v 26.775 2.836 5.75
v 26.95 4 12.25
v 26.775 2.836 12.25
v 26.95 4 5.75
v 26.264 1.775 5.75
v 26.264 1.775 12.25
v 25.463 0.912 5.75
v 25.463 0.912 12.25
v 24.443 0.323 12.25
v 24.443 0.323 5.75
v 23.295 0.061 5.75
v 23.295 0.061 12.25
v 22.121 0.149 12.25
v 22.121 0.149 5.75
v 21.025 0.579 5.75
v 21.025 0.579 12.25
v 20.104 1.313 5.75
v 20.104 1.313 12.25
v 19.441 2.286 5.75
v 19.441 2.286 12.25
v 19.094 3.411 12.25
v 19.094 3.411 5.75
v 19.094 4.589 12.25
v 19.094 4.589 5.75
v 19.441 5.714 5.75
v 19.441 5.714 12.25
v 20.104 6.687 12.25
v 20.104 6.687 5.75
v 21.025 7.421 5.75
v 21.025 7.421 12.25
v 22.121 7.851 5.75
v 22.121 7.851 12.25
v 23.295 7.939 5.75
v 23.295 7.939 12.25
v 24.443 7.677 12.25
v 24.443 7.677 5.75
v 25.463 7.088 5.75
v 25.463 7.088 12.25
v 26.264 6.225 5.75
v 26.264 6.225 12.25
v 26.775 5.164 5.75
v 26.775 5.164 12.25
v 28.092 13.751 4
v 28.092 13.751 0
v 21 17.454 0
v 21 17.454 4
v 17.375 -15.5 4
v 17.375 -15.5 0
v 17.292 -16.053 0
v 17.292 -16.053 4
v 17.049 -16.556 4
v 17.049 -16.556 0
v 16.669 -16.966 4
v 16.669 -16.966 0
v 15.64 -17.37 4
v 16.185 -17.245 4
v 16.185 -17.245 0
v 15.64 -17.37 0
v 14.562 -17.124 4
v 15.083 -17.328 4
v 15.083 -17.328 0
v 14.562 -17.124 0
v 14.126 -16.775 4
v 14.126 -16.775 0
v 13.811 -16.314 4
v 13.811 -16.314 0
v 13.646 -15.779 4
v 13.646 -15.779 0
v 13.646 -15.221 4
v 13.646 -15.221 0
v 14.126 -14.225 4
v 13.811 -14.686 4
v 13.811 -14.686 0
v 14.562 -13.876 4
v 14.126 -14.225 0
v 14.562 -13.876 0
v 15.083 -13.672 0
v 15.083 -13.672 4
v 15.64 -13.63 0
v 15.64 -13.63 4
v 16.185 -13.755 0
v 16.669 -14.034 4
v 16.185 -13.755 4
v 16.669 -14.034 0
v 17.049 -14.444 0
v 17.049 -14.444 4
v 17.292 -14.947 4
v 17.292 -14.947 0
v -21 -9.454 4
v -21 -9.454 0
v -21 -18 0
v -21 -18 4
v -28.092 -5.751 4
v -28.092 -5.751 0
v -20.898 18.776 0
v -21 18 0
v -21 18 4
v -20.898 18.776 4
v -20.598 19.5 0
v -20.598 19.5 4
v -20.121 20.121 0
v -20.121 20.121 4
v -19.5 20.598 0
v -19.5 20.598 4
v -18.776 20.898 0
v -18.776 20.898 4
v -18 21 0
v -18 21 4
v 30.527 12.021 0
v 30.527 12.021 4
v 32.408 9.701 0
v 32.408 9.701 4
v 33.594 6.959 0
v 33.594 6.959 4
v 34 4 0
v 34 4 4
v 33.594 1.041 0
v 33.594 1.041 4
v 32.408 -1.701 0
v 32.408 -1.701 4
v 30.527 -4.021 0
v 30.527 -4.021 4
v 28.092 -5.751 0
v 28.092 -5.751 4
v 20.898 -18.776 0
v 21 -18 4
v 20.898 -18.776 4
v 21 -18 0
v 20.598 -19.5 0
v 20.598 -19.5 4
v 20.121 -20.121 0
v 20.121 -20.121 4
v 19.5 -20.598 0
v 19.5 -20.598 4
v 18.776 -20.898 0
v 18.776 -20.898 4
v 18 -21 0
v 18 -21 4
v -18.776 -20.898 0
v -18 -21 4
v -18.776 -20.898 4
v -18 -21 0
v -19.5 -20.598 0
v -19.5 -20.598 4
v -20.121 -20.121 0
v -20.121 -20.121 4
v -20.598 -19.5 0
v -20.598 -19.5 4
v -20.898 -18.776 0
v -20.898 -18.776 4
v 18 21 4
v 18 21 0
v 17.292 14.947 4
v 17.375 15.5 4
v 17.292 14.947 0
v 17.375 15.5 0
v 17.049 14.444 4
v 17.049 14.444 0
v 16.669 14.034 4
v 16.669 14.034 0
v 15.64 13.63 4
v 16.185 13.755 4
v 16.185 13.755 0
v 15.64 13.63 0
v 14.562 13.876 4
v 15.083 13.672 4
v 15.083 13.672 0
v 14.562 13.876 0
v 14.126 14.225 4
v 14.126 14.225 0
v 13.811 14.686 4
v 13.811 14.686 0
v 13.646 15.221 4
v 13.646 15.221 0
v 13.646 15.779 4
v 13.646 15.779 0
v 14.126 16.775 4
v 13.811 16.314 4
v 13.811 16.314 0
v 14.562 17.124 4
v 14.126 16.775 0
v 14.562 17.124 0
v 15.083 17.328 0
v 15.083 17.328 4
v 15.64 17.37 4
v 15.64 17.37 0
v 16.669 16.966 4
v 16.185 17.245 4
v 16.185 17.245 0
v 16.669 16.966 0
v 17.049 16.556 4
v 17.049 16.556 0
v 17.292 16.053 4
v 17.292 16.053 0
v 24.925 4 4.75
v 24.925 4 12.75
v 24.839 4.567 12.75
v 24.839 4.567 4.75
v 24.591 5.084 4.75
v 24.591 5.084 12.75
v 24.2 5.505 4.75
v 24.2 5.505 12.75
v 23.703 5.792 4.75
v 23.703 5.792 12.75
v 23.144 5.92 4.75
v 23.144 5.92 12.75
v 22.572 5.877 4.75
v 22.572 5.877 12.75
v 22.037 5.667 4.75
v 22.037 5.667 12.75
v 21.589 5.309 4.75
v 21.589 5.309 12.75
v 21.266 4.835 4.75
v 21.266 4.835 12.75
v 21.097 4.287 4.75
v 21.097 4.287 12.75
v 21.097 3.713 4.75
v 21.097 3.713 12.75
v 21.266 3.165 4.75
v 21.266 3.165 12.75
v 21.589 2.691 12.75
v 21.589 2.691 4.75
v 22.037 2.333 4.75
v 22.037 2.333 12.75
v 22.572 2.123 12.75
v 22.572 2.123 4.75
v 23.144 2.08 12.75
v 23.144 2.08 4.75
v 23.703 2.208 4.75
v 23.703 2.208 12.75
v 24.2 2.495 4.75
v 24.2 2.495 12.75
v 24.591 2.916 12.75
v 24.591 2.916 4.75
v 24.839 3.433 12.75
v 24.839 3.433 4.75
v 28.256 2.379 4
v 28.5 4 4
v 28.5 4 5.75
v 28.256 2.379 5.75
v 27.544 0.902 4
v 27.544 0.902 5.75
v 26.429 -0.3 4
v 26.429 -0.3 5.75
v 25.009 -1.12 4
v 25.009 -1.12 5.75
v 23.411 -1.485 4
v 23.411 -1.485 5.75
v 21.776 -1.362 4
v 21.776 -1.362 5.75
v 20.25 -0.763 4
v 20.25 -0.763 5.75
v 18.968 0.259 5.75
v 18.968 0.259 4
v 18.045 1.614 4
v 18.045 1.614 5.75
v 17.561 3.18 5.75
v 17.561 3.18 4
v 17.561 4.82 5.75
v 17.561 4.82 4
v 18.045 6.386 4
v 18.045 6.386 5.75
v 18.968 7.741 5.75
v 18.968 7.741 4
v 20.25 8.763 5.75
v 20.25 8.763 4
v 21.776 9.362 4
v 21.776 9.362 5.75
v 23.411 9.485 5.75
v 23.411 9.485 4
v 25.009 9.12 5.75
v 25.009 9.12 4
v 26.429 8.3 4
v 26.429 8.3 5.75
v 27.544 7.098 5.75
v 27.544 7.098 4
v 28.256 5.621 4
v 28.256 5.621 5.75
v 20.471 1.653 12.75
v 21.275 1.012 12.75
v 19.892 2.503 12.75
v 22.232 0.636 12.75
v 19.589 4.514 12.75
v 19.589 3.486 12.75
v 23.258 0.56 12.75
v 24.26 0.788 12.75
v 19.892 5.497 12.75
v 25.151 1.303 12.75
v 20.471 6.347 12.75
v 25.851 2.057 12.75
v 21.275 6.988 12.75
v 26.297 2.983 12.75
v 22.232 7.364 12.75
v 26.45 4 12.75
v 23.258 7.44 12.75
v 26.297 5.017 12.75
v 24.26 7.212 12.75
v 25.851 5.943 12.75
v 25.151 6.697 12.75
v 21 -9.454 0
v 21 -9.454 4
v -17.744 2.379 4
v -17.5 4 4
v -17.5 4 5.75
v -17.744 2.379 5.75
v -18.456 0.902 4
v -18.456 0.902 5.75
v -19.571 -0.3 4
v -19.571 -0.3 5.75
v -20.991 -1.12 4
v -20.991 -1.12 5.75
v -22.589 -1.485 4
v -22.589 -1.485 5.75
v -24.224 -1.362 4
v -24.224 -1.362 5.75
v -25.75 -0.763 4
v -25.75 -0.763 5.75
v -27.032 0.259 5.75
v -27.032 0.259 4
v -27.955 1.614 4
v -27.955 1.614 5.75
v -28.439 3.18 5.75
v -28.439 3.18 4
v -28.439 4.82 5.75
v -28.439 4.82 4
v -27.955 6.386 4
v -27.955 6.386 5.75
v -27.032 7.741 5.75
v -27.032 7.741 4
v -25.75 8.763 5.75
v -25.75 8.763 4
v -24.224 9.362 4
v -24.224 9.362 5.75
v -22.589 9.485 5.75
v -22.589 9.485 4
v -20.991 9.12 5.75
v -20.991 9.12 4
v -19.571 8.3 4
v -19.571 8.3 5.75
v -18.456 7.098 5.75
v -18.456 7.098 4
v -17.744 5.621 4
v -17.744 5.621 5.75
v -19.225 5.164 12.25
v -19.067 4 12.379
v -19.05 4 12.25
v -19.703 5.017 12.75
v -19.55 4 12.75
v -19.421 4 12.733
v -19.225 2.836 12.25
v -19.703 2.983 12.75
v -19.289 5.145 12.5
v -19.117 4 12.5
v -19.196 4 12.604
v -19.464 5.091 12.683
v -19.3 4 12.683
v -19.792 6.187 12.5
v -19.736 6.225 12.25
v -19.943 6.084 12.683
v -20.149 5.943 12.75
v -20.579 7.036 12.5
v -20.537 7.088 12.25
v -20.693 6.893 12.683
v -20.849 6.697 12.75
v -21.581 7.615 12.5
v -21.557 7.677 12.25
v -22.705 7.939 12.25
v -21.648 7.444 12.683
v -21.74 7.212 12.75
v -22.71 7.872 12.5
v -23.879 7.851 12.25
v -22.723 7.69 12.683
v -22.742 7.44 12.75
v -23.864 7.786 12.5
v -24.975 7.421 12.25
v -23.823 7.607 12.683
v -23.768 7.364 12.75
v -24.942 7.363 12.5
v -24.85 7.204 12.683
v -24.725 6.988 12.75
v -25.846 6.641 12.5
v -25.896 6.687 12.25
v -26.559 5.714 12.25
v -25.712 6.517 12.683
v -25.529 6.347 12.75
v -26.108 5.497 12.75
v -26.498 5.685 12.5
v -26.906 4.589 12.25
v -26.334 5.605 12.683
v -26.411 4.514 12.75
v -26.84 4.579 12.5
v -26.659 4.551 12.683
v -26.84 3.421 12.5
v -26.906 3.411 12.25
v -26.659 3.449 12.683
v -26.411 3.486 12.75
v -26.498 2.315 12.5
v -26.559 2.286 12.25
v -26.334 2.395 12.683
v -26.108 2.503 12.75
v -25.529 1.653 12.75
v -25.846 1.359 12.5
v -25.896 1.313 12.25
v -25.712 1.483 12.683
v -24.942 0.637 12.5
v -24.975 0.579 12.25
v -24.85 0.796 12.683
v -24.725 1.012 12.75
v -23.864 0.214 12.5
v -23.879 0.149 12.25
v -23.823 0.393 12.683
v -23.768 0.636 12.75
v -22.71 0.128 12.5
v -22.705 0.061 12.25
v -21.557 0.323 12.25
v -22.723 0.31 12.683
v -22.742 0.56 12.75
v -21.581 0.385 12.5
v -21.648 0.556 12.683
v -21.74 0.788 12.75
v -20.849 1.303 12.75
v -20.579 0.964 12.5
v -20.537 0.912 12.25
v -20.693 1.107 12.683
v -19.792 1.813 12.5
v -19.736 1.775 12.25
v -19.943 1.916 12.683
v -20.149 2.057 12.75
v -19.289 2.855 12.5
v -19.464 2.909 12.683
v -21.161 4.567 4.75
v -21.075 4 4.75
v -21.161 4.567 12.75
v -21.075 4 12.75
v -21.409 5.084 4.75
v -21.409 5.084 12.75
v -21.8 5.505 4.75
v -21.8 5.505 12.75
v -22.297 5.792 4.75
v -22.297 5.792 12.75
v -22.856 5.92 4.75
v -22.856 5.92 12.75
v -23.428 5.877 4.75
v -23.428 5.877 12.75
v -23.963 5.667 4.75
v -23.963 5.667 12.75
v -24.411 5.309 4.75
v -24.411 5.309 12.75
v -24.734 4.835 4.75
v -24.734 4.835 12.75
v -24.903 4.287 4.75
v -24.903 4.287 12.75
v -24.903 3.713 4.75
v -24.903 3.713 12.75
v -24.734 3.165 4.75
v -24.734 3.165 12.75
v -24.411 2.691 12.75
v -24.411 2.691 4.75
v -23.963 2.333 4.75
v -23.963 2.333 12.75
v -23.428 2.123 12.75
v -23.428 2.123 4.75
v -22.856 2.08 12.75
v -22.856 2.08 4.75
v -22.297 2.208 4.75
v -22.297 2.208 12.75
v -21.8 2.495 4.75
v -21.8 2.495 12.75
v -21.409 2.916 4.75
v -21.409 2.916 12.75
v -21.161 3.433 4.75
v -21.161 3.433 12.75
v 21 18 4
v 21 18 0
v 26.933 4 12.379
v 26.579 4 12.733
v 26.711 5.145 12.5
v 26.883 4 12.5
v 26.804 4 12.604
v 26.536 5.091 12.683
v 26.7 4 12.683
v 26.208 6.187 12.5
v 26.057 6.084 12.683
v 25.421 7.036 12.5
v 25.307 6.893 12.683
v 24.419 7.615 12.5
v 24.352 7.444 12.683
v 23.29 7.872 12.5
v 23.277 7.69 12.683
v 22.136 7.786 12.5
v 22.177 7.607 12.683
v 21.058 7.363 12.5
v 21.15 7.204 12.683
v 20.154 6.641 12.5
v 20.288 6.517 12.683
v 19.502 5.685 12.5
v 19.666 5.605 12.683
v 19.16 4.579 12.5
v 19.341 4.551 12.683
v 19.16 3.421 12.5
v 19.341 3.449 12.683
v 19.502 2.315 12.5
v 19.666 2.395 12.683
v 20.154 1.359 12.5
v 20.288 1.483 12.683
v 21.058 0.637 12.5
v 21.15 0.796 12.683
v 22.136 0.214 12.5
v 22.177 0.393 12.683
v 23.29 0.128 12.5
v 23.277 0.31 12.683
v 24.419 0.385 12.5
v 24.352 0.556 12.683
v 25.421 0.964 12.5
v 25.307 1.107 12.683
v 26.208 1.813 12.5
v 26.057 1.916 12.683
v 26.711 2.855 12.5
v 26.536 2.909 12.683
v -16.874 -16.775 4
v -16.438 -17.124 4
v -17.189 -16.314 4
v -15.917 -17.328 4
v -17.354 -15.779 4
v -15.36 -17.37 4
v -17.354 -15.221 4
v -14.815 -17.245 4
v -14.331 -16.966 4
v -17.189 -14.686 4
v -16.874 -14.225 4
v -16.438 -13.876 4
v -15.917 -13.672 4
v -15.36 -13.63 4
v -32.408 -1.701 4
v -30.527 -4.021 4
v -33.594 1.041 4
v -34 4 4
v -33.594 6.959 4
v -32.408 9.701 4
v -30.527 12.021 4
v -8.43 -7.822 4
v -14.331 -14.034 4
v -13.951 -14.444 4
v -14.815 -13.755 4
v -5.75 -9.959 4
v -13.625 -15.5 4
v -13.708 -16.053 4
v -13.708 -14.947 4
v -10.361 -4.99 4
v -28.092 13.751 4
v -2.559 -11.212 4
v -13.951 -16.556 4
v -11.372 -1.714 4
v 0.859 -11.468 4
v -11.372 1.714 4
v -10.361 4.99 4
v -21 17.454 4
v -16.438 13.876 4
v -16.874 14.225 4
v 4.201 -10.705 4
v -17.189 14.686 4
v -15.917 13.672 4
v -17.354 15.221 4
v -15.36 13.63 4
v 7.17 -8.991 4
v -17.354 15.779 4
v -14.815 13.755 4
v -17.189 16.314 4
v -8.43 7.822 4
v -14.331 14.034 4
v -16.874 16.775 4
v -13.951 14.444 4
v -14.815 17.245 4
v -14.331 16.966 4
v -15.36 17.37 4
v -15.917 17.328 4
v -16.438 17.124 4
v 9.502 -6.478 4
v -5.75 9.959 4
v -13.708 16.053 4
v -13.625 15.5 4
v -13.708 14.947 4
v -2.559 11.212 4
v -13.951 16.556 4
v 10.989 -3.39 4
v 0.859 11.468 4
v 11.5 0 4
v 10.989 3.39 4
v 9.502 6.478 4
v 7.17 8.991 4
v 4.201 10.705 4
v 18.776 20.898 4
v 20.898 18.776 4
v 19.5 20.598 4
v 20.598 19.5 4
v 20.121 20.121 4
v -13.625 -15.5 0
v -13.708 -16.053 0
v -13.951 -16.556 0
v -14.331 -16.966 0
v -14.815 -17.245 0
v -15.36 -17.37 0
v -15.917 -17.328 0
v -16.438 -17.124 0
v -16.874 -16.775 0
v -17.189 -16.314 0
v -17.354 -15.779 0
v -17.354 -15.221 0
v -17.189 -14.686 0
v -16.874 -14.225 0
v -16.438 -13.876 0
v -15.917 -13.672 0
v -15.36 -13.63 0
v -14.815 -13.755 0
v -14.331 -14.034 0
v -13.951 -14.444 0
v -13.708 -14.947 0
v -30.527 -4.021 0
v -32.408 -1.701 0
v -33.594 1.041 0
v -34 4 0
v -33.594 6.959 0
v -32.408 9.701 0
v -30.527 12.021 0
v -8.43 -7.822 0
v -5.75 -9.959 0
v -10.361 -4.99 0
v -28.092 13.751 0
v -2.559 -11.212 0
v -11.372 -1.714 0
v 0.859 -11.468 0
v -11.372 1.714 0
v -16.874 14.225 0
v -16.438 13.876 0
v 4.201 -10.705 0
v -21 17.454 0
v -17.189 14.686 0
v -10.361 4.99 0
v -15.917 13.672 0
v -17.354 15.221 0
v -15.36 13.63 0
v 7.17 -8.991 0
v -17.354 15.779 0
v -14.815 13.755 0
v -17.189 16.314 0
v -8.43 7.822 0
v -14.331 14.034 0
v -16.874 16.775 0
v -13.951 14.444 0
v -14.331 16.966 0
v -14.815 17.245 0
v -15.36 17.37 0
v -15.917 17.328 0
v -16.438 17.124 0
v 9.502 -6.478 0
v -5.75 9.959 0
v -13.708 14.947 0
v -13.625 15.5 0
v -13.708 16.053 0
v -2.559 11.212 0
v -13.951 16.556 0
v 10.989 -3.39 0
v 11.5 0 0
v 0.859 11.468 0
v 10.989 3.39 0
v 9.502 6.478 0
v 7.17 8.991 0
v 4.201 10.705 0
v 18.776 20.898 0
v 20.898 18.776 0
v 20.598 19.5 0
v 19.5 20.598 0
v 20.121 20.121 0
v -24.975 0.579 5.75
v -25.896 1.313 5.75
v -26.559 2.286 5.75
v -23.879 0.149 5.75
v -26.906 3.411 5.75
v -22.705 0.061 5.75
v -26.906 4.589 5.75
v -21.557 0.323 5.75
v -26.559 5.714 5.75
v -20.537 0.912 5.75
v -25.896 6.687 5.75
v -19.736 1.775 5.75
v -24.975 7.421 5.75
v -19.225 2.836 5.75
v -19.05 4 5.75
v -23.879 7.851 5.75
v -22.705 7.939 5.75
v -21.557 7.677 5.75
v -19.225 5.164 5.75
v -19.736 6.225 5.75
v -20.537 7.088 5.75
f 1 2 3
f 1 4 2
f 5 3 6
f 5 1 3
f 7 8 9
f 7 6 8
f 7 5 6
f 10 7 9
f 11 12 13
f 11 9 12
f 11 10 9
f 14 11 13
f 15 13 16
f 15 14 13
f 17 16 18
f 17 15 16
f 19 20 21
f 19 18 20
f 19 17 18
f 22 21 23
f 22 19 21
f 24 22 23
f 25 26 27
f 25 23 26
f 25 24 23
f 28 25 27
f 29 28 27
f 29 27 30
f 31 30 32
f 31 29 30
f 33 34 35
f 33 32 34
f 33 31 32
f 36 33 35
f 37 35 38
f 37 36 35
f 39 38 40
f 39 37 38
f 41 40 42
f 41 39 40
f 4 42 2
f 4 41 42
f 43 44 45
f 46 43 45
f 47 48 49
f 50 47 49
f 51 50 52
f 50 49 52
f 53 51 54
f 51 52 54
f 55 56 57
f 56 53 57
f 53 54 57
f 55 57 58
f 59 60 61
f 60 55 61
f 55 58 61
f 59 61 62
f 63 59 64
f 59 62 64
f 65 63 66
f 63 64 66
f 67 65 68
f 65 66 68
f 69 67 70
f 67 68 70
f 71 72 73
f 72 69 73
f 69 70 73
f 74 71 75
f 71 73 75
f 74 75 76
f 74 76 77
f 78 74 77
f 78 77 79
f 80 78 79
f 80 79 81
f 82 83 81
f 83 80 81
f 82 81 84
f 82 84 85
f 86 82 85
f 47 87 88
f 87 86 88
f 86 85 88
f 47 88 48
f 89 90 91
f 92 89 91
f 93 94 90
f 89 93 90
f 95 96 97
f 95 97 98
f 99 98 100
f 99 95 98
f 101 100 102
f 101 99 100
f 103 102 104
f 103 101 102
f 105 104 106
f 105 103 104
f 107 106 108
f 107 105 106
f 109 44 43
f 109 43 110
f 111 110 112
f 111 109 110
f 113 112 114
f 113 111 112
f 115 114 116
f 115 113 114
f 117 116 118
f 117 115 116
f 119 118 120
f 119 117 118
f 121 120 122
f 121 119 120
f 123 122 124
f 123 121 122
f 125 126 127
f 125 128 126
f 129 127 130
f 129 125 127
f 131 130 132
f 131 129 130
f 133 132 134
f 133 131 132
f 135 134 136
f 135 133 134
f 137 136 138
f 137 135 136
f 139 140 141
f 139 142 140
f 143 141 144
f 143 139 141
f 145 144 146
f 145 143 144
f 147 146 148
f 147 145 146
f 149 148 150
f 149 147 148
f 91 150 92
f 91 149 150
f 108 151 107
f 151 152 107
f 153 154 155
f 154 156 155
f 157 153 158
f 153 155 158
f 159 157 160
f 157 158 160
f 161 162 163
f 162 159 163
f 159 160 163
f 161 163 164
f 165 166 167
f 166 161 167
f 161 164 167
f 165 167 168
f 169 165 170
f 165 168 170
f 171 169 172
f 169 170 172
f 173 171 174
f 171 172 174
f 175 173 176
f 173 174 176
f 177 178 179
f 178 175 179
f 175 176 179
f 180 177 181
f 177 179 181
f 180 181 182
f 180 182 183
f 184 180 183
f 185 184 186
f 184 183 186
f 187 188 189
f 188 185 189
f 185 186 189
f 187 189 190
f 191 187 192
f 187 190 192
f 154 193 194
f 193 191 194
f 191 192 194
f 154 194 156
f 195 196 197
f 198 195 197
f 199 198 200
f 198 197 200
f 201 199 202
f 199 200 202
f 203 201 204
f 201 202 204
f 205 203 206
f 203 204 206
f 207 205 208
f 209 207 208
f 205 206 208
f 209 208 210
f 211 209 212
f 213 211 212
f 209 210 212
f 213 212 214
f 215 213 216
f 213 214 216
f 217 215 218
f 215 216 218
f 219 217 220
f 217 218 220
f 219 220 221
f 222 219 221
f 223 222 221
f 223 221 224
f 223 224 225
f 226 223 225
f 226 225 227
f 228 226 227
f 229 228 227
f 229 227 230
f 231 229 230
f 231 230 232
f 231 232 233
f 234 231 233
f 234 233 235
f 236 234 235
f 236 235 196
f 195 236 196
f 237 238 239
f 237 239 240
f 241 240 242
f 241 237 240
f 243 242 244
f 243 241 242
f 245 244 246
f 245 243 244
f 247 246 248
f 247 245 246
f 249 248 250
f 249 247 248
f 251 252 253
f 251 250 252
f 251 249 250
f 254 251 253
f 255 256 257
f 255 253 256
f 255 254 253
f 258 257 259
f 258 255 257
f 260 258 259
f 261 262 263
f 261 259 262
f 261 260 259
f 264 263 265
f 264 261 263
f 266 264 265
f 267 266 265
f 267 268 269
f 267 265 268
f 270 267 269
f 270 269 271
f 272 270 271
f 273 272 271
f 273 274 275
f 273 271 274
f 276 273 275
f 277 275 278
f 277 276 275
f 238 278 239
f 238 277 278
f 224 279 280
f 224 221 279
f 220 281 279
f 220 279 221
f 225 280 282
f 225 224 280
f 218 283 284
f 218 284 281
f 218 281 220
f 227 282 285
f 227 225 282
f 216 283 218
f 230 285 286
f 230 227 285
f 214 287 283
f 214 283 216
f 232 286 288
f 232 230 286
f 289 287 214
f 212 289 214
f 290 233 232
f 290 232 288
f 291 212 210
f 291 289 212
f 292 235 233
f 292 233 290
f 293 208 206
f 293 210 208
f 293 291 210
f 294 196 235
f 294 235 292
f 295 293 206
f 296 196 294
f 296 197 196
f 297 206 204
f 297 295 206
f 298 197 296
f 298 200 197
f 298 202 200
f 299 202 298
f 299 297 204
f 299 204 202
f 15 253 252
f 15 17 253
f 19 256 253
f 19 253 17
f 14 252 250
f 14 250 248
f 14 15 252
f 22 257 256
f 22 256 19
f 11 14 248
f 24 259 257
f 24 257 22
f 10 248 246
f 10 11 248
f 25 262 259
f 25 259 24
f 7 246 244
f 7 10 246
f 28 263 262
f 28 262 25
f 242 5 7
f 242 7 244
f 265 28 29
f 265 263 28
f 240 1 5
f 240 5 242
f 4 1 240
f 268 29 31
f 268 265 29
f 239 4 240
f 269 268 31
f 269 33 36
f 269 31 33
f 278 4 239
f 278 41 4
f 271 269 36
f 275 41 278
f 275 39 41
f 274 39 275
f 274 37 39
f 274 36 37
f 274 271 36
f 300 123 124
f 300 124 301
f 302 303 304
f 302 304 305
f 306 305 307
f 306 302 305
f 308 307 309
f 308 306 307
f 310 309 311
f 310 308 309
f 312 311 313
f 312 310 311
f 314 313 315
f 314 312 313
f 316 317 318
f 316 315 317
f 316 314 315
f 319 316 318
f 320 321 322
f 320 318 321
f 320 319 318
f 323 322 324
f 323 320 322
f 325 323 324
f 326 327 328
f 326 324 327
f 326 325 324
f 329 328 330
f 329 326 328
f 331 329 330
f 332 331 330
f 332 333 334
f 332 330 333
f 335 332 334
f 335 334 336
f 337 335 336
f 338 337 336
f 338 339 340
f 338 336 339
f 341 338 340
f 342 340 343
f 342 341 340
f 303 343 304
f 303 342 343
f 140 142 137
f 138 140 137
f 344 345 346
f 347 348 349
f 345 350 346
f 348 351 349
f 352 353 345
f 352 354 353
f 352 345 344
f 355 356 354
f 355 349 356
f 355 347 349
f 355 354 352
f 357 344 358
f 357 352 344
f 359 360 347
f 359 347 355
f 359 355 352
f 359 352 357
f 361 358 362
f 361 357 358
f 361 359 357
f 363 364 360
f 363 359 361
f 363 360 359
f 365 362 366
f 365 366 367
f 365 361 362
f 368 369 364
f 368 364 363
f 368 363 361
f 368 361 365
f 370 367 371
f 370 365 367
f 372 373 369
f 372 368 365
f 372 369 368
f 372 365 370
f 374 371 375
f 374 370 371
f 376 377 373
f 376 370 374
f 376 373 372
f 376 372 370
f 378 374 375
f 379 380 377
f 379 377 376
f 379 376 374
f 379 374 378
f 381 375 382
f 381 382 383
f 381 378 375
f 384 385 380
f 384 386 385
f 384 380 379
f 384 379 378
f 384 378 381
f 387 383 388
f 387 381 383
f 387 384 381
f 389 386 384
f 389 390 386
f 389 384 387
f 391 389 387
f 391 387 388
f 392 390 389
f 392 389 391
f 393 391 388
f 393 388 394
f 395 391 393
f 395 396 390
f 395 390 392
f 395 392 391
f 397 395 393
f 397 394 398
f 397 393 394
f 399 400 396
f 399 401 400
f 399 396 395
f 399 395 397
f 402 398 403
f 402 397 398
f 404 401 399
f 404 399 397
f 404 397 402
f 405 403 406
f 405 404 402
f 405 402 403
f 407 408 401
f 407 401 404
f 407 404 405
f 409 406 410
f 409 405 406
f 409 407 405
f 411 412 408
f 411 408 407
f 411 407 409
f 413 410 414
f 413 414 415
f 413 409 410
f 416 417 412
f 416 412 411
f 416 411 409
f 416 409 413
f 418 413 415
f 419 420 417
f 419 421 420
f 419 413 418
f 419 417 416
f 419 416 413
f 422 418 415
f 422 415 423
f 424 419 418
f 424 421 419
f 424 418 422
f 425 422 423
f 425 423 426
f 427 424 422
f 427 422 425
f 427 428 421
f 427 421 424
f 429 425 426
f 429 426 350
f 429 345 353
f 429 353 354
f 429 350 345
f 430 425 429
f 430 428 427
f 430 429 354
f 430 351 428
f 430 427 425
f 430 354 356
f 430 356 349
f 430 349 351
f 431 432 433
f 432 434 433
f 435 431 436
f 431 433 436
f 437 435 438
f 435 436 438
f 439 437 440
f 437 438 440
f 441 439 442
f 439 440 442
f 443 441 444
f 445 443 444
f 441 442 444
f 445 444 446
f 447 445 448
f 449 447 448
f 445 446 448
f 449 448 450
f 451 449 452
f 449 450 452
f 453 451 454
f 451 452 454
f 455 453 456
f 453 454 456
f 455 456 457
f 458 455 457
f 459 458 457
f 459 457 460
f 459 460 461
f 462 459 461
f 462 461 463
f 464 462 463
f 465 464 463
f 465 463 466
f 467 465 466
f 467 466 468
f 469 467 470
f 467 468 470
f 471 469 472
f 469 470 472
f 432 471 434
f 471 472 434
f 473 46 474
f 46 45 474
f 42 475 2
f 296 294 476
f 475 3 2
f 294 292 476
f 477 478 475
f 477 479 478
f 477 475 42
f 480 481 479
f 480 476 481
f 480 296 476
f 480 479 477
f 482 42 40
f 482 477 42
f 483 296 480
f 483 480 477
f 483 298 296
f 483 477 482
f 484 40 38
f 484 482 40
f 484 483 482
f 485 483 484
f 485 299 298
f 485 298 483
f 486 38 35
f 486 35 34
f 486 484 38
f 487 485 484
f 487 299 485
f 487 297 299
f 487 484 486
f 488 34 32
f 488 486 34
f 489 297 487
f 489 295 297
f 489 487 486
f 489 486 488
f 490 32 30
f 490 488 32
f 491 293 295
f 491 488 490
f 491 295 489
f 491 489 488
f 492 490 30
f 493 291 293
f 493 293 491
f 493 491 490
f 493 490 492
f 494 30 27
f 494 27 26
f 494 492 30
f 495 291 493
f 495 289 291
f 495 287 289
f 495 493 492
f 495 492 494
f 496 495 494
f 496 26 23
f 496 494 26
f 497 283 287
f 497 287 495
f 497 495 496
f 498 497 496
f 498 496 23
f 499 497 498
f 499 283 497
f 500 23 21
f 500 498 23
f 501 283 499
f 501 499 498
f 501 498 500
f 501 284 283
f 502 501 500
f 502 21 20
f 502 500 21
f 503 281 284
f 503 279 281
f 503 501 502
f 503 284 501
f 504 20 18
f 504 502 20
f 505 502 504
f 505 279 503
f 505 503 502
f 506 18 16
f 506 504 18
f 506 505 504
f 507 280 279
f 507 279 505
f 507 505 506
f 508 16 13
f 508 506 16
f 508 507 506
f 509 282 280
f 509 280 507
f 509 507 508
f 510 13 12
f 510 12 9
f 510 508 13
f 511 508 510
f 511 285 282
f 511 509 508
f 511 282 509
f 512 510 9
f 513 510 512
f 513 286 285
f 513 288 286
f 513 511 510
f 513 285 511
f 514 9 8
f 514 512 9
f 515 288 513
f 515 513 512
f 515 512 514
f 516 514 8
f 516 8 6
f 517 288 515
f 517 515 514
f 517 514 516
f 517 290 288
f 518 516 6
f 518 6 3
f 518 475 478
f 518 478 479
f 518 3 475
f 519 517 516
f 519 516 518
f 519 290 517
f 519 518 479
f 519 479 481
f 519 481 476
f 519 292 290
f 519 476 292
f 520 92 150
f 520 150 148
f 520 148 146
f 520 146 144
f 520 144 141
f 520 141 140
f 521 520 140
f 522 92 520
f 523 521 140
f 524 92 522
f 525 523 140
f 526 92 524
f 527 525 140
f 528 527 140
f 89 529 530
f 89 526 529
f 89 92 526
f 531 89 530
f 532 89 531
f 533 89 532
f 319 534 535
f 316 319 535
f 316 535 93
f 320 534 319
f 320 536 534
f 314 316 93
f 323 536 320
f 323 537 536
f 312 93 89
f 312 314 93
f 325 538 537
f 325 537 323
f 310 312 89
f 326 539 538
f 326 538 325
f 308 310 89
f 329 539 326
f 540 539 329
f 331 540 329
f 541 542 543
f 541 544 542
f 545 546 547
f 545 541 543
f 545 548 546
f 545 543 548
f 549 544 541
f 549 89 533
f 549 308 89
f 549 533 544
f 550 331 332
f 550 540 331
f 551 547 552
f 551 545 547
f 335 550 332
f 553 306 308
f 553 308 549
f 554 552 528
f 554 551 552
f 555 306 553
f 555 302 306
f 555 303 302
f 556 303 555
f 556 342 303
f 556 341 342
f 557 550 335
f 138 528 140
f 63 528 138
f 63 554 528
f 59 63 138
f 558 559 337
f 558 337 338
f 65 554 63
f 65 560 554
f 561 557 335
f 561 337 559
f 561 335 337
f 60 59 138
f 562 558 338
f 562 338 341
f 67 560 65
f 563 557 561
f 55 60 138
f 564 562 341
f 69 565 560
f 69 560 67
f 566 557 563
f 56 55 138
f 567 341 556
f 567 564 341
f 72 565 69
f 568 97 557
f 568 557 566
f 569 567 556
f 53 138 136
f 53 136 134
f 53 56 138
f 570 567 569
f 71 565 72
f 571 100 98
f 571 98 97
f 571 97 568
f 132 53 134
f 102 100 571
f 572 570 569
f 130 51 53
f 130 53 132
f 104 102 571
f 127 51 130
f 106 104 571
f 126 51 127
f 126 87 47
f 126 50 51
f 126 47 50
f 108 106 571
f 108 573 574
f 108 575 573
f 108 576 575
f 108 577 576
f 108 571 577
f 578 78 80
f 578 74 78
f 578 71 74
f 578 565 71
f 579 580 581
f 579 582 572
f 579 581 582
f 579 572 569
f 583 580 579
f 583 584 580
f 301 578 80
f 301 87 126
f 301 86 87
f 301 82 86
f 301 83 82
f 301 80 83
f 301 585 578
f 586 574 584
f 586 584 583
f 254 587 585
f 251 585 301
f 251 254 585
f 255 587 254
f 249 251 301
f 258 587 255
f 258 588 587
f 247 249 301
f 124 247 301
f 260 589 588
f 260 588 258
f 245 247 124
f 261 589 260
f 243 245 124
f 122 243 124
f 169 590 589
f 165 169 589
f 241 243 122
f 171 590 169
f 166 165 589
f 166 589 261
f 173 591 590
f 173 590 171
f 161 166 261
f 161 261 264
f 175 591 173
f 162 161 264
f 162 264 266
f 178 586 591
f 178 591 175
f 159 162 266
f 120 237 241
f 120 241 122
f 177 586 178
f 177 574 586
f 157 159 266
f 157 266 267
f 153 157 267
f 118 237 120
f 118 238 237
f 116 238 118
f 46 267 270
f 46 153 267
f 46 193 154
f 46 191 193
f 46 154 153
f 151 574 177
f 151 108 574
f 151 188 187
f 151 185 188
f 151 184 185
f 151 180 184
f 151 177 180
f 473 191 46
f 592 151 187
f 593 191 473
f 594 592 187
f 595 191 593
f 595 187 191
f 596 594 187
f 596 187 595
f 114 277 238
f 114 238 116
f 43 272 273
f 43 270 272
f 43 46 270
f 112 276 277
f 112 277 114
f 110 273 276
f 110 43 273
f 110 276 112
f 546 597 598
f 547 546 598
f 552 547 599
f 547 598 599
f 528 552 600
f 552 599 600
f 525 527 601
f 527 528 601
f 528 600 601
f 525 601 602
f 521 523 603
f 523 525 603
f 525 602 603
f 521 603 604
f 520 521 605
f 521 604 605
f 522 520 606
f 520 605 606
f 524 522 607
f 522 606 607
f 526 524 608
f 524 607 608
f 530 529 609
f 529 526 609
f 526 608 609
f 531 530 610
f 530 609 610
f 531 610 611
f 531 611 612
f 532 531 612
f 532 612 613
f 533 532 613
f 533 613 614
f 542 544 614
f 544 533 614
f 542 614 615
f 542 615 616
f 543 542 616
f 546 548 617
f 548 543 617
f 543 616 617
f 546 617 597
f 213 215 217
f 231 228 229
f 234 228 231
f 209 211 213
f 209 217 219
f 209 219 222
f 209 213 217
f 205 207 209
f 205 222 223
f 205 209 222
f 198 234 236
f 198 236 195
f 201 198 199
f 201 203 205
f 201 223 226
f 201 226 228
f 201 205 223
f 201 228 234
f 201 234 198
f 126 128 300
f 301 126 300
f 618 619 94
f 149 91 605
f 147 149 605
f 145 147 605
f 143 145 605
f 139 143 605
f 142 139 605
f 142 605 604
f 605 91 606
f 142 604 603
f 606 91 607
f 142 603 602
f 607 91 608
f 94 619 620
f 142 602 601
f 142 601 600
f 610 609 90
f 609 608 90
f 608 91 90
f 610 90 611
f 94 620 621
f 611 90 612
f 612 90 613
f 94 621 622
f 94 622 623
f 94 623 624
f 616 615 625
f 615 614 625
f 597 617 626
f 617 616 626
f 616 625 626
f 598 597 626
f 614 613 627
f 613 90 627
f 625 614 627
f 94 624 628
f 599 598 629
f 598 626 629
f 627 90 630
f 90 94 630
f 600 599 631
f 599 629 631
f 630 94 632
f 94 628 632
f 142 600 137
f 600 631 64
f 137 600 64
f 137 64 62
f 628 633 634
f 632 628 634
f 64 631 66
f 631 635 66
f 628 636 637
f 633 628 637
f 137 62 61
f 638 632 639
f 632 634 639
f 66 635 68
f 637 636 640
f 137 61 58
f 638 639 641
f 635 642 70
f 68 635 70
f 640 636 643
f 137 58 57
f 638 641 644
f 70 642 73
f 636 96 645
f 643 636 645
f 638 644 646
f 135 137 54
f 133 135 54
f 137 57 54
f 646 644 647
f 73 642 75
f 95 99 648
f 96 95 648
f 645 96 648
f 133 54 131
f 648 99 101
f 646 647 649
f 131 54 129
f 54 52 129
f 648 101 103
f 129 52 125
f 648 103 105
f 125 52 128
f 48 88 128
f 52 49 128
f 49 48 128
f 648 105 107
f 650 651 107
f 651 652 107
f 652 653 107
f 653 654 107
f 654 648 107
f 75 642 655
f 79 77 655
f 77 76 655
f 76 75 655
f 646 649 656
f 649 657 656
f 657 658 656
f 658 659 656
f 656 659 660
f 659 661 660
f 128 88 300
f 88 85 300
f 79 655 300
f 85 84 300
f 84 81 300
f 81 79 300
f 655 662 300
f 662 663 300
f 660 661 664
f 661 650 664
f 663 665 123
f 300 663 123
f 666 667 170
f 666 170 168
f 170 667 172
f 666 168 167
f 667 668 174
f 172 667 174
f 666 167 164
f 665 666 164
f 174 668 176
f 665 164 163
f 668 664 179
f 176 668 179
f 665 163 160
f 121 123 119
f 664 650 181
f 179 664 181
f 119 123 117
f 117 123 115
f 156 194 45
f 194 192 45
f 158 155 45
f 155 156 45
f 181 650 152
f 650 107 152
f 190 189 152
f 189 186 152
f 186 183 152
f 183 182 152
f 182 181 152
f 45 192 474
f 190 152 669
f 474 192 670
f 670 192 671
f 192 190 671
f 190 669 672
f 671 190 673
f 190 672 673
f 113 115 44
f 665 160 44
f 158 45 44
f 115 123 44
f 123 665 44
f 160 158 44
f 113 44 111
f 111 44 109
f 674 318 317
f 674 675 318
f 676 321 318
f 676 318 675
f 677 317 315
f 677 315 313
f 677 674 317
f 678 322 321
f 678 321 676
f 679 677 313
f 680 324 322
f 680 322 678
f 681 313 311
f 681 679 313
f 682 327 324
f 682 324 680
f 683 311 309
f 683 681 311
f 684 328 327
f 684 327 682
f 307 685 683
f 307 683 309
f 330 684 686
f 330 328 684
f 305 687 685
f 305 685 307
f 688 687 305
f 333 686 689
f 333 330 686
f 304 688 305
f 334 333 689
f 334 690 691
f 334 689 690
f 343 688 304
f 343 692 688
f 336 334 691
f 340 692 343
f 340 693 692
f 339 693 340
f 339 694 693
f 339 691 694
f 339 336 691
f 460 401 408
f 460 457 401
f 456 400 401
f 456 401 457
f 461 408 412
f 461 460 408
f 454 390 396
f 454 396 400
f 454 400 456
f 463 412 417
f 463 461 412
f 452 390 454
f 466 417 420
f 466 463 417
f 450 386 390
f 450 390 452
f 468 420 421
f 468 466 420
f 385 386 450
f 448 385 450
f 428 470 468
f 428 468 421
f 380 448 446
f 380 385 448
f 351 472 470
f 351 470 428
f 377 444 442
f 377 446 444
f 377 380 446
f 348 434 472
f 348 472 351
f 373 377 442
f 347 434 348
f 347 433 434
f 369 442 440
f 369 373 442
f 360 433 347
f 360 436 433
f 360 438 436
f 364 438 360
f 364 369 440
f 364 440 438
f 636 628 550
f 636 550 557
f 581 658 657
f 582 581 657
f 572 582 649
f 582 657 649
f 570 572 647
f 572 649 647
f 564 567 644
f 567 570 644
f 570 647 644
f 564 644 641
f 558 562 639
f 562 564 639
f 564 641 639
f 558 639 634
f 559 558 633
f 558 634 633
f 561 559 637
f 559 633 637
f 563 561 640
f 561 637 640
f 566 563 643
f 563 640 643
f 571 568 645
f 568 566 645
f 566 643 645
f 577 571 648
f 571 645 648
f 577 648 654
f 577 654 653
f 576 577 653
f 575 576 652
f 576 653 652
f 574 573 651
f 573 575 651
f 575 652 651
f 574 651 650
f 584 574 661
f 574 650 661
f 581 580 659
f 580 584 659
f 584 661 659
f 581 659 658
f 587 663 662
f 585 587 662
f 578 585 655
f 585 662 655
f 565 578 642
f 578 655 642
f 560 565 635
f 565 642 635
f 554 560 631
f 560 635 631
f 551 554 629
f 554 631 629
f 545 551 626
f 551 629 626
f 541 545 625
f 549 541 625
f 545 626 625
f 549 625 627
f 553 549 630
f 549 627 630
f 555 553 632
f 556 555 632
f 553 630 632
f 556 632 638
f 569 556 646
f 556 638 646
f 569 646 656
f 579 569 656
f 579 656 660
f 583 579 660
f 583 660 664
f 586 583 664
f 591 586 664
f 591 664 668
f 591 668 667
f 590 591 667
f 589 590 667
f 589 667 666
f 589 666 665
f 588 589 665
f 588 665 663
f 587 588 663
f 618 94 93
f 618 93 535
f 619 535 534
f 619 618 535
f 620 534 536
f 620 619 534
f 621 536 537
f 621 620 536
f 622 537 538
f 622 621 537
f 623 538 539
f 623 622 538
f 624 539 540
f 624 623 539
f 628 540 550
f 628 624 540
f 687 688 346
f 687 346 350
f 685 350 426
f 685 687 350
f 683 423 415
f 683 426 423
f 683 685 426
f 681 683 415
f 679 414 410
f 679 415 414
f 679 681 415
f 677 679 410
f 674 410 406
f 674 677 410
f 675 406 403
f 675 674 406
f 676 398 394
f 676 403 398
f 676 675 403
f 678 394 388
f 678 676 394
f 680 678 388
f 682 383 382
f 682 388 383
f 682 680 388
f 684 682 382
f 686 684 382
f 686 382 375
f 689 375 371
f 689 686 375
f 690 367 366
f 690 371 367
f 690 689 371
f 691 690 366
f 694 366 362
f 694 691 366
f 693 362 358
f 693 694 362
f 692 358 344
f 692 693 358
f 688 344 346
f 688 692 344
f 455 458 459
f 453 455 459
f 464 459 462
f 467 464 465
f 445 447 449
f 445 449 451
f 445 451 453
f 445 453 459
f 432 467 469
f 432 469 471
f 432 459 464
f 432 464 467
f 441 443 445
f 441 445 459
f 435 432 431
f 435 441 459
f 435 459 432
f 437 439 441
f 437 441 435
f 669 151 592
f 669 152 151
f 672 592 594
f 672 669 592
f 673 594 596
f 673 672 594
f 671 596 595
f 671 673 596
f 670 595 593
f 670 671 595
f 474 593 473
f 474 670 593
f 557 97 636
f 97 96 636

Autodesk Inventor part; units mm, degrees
ref_plane "YZ Plane" through (0, 0, 0) normal (1, 0, 0) x (0, 1, 0)
ref_plane "XZ Plane" through (0, 0, 0) normal (0, 1, 0) x (-1, 0, 0)
ref_plane "XY Plane" through (0, 0, 0) normal (0, 0, 1) x (1, 0, 0)
sketch "Sketch1" plane through (0, 0, 0) normal (0, 0, 1) x (1, 0, 0)
  circle A0 centre (0, 0) radius 11.5
  line L0 (-18, -21) -> (18, -21)
  line L1 (21, -18) -> (21, 18)
  line L2 (18, 21) -> (-18, 21)
  line L3 (-21, 18) -> (-21, -18)
  line L4 (-21, -21) -> (21, 21) construction
  line L5 (21, -21) -> (-21, 21) construction
  circle A1 centre (-15.5, 15.5) radius 1.875
  circle A2 centre (15.5, 15.5) radius 1.875
  circle A3 centre (15.5, -15.5) radius 1.875
  circle A4 centre (-15.5, -15.5) radius 1.875
  line L6 (-15.5, 15.5) -> (15.5, 15.5) construction
  line L7 (15.5, 15.5) -> (15.5, -15.5) construction
  line L8 (15.5, -15.5) -> (-15.5, -15.5) construction
  line L9 (-15.5, 15.5) -> (-15.5, -15.5) construction
  line L10 (-15.5, 15.5) -> (15.5, -15.5) construction
  line L11 (15.5, 15.5) -> (0, 0) construction
  circle A5 centre (-23, 4) radius 3.95
  circle A6 centre (23, 4) radius 3.95
  circle A7 centre (-23, 4) radius 11
  circle A8 centre (23, 4) radius 11
  line L12 (0, 126.4593) -> (0, -125.5407) projected
  line L13 (-111.8366, 0) -> (126.1634, 0) projected
  circle A9 centre (-48.8366, 35.9593) radius 2.0625 projected
  circle A10 centre (-57.8366, 80.4593) radius 2.0625 projected
  circle A11 centre (-66.8366, 35.9593) radius 2.0625 projected
  circle A12 centre (-66.8366, 60.9593) radius 2.0625 projected
  circle A13 centre (-48.8366, 60.9593) radius 2.0625 projected
  circle A14 centre (63.1634, 35.9593) radius 2.0625 projected
  circle A15 centre (72.1634, 80.4593) radius 2.0625 projected
  circle A16 centre (81.1634, 35.9593) radius 2.0625 projected
  circle A17 centre (81.1634, 60.9593) radius 2.0625 projected
  circle A18 centre (63.1634, 60.9593) radius 2.0625 projected
  circle A19 centre (-48.8366, -35.0407) radius 2.0625 projected
  circle A20 centre (-57.8366, -79.5407) radius 2.0625 projected
  circle A21 centre (-66.8366, -35.0407) radius 2.0625 projected
  circle A22 centre (-66.8366, -60.0407) radius 2.0625 projected
  circle A23 centre (-48.8366, -60.0407) radius 2.0625 projected
  circle A24 centre (63.1634, -35.0407) radius 2.0625 projected
  circle A25 centre (63.1634, -60.0407) radius 2.0625 projected
  circle A26 centre (81.1634, -60.0407) radius 2.0625 projected
  circle A27 centre (81.1634, -35.0407) radius 2.0625 projected
  circle A28 centre (72.1634, -79.5407) radius 2.0625 projected
  line L14 (92.1634, -89.5407) -> (92.1634, 90.4593) projected
  line L15 (92.1634, 90.4593) -> (-77.8366, 90.4593) projected
  line L16 (-77.8366, 90.4593) -> (-77.8366, -89.5407) projected
  line L17 (-77.8366, -89.5407) -> (92.1634, -89.5407) projected
  circle A29 centre (-48.8366, 35.9593) radius 2.0625 projected
  circle A30 centre (-57.8366, 80.4593) radius 2.0625 projected
  circle A31 centre (-66.8366, 35.9593) radius 2.0625 projected
  circle A32 centre (-66.8366, 60.9593) radius 2.0625 projected
  circle A33 centre (-48.8366, 60.9593) radius 2.0625 projected
  circle A34 centre (63.1634, 35.9593) radius 2.0625 projected
  circle A35 centre (72.1634, 80.4593) radius 2.0625 projected
  circle A36 centre (81.1634, 35.9593) radius 2.0625 projected
  circle A37 centre (81.1634, 60.9593) radius 2.0625 projected
  circle A38 centre (63.1634, 60.9593) radius 2.0625 projected
  circle A39 centre (-48.8366, -35.0407) radius 2.0625 projected
  circle A40 centre (-57.8366, -79.5407) radius 2.0625 projected
  circle A41 centre (-66.8366, -35.0407) radius 2.0625 projected
  circle A42 centre (-66.8366, -60.0407) radius 2.0625 projected
  circle A43 centre (-48.8366, -60.0407) radius 2.0625 projected
  circle A44 centre (63.1634, -35.0407) radius 2.0625 projected
  circle A45 centre (63.1634, -60.0407) radius 2.0625 projected
  circle A46 centre (81.1634, -60.0407) radius 2.0625 projected
  circle A47 centre (81.1634, -35.0407) radius 2.0625 projected
  circle A48 centre (72.1634, -79.5407) radius 2.0625 projected
  line L18 (92.1634, -89.5407) -> (92.1634, 90.4593) projected
  line L19 (92.1634, 90.4593) -> (-77.8366, 90.4593) projected
  line L20 (-77.8366, 90.4593) -> (-77.8366, -89.5407) projected
  line L21 (-77.8366, -89.5407) -> (92.1634, -89.5407) projected
  arc A49 (-18, 21) -> (-21, 18) centre (-18, 18) ccw
  arc A50 (21, 18) -> (18, 21) centre (18, 18) ccw
  arc A51 (18, -21) -> (21, -18) centre (18, -18) ccw
  arc A52 (-21, -18) -> (-18, -21) centre (-18, -18) ccw
  line L22 (-28.0915, -5.7507) -> (-21, -9.4536)
  line L23 (-28.0915, 13.7507) -> (-21, 17.4536)
  line L24 (28.0915, -5.7507) -> (21, -9.4536)
  line L25 (28.0915, 13.7507) -> (21, 17.4536)
  circle A53 centre (-23, 4) radius 5.5
  circle A54 centre (23, 4) radius 5.5
  dimension "d0" = 23
  dimension "d1" = 3.75
  dimension "d2" = 31
  dimension "d3" = 31
  dimension "d4" = 22
  dimension "d5" = 42
  dimension "d6" = 42
  dimension "d7" = 23
  dimension "d8" = 4
  dimension "d9" = 7.9
  dimension "d10" = 3
  dimension "d11" = 8
  dimension "d12" = 11
extrude "Extrusion1" add sketch "Sketch1" along normal blind 4 contours L13 A8 L1 A51 L0 L12 A0 | A0 L12 L2 A50 L1 A8 L13 | A0 L13 A7 L3 A49 L2 L12 | L12 L0 A52 L3 A7 L13 A0 | L13 A54 L1 A8 | A8 L1 A54 L13 | A8 L13 A54 L1 | L1 L25 A8 | A8 L24 L1 | L1 A54 L13 A8 | A54 L1 A6 L13 | L13 L1 A54 | L13 A53 L3 A7 | A7 L3 A53 L13 | A54 L13 L1 A6 | L1 L13 A54 | A7 L13 A53 L3 | L3 L22 A7 | A53 L3 L13 | L13 L3 A5 A53 | A6 L1 | L1 A6 | A53 L13 L3 | A7 L23 L3 | L3 A53 L13 A7 | L13 A53 L3 A5 | A5 L3 | L3 A5
sketch "Sketch2" plane through (0, 0, 4) normal (0, 0, 1) x (1, 0, 0)
  circle A0 centre (0, 0) radius 11.5 projected
  circle A1 centre (-15.5, -15.5) radius 1.875 projected
  circle A2 centre (15.5, -15.5) radius 1.875 projected
  circle A3 centre (15.5, 15.5) radius 1.875 projected
  circle A4 centre (-15.5, 15.5) radius 1.875 projected
  line L0 (28.0915, 13.7507) -> (21, 17.4536) projected
  line L1 (21, 17.4536) -> (21, 18) projected
  arc A5 (21, 18) -> (18, 21) centre (18, 18) ccw projected
  line L2 (18, 21) -> (-18, 21) projected
  arc A6 (-18, 21) -> (-21, 18) centre (-18, 18) ccw projected
  line L3 (-21, 18) -> (-21, 17.4536) projected
  line L4 (-21, 17.4536) -> (-28.0915, 13.7507) projected
  arc A7 (-28.0915, 13.7507) -> (-28.0915, -5.7507) centre (-23, 4) ccw projected
  line L5 (-28.0915, -5.7507) -> (-21, -9.4536) projected
  line L6 (-21, -9.4536) -> (-21, -18) projected
  arc A8 (-21, -18) -> (-18, -21) centre (-18, -18) ccw projected
  line L7 (-18, -21) -> (18, -21) projected
  arc A9 (18, -21) -> (21, -18) centre (18, -18) ccw projected
  line L8 (21, -18) -> (21, -9.4536) projected
  line L9 (21, -9.4536) -> (28.0915, -5.7507) projected
  arc A10 (28.0915, -5.7507) -> (28.0915, 13.7507) centre (23, 4) ccw projected
  circle A11 centre (23, 4) radius 5.5
  circle A12 centre (-23, 4) radius 5.5
  circle A13 centre (23, 4) radius 3.95
  circle A14 centre (-23, 4) radius 3.95
  dimension "d15" = 11
  dimension "d16" = 7.9
  dimension "d17" = 7.9
  dimension "d18" = 11
extrude "Extrusion2" add sketch "Sketch2" along normal blind 8.75 contours A13 | A14
extrude "Extrusion3" add sketch "Sketch2" along normal blind 1.75 contours A11 | A12
fillet "Fillet1" radius 0.5 2 edges at (19.05, 4, 12.75) (-26.95, 4, 12.75)
sketch "Sketch3" plane through (23, 4, 12.75) normal (0, 0, 1) x (1, 0, 0)
  circle A0 centre (0, 0) radius 3.45 projected
  circle A1 centre (-46, 0) radius 3.45 projected
  circle A2 centre (0, 0) radius 1.925
  circle A3 centre (-46, 0) radius 1.925
  point P0 (-23, -4)
  dimension "d24" = 3.85
extrude "Extrusion4" cut sketch "Sketch3" against normal blind 8 contours A2 | A3
properties part number "Stepper Atachments"
